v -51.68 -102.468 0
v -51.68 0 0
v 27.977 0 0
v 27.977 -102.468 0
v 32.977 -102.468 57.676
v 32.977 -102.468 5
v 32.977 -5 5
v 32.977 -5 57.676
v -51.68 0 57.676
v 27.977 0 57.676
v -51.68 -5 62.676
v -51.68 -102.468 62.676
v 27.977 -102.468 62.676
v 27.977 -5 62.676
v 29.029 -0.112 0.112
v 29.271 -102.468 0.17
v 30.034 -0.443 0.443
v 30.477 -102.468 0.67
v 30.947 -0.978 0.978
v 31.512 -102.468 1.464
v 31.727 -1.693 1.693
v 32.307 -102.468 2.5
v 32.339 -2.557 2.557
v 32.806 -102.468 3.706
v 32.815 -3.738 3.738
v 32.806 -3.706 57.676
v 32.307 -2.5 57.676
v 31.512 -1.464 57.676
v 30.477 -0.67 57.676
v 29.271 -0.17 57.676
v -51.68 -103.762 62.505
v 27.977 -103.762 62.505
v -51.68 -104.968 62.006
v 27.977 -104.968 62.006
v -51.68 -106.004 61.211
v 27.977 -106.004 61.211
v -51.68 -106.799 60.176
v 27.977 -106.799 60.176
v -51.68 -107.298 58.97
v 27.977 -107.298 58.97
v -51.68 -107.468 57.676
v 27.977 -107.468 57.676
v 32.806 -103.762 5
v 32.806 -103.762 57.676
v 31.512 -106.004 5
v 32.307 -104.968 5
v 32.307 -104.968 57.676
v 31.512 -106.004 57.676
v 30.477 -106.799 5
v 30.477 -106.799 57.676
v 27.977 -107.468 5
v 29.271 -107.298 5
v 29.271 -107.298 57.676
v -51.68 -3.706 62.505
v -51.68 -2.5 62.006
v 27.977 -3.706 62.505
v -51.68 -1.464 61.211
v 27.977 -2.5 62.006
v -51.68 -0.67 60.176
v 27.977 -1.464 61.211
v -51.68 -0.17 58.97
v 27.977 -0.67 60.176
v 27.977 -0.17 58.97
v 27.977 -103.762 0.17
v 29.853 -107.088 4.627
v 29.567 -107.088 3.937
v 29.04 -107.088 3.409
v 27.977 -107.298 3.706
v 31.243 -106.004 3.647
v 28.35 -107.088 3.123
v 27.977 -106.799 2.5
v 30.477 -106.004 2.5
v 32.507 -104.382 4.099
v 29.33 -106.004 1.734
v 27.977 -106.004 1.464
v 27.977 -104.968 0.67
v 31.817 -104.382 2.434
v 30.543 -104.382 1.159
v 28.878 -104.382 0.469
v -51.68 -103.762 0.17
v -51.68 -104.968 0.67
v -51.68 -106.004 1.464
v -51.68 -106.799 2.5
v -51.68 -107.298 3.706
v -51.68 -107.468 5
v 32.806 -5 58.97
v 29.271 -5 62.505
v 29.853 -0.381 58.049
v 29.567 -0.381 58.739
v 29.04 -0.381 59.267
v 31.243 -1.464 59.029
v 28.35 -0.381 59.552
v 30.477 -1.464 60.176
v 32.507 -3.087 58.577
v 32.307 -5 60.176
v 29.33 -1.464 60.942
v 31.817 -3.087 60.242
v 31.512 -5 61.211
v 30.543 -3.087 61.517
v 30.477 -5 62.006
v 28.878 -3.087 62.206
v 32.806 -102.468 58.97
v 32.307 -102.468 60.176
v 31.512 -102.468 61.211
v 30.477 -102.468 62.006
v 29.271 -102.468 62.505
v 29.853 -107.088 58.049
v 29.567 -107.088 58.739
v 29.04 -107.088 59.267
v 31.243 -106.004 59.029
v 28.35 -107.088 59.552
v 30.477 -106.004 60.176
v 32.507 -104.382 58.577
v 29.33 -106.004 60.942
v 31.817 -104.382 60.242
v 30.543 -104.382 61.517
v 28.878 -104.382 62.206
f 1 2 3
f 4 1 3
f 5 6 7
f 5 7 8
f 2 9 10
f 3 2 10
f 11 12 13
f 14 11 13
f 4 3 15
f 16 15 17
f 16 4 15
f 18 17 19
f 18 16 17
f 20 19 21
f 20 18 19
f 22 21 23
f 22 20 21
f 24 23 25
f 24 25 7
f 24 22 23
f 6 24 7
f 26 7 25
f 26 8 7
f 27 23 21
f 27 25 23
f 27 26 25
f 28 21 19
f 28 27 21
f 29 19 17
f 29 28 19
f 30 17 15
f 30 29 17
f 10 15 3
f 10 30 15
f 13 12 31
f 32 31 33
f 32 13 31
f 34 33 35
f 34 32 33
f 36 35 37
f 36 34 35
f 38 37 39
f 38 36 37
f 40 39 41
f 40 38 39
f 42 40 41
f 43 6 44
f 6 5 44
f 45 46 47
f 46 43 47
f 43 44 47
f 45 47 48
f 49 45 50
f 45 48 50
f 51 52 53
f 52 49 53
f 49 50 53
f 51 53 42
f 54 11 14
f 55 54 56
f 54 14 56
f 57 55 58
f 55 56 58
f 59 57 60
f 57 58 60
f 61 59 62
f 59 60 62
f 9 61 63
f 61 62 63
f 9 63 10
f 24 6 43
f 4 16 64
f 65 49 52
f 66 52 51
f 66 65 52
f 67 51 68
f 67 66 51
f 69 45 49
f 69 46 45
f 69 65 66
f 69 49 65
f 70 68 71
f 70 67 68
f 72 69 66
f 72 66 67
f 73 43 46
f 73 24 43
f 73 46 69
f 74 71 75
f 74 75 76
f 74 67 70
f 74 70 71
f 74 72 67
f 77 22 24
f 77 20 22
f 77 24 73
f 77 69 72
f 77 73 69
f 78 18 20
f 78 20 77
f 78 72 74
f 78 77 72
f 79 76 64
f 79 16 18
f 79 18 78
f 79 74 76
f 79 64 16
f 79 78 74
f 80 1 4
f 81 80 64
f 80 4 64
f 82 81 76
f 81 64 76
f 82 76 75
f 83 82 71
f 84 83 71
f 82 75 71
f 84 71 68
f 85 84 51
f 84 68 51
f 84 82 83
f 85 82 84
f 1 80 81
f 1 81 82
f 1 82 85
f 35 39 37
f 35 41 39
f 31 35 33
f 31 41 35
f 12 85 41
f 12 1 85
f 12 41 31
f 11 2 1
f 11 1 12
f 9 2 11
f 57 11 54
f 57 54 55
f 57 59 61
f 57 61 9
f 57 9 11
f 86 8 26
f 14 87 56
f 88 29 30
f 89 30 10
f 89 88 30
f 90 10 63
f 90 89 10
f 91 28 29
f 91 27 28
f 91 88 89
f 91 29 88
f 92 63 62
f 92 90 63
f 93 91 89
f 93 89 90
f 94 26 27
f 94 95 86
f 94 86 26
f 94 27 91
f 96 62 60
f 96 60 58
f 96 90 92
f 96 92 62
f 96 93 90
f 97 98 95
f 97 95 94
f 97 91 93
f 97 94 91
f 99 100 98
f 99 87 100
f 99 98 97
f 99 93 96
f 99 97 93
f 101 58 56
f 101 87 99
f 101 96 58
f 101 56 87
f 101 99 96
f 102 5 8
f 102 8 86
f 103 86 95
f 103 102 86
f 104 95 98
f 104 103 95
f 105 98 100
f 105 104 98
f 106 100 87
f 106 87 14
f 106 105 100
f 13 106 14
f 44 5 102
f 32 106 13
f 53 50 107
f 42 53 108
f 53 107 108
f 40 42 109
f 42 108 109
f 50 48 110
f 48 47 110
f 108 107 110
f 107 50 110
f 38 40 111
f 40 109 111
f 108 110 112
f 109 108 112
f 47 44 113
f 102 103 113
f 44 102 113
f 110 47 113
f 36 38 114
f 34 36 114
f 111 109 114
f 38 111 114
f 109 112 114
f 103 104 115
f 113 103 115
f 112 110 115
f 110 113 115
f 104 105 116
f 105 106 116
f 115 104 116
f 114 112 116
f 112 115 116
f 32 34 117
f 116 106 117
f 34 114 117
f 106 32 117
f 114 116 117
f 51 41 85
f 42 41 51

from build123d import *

# Parameters (mm, degrees)
F0_W     = 84.656242
F0_H     = 62.675737
F1_DEPTH = 107.468396
F2_R     = 5


with BuildPart() as f1:
    # F0 (on Front) → F1 (new body)
    with BuildSketch(Plane.XZ):
        with Locations((-9.351572, 31.337868)):
            Rectangle(F0_W, F0_H)
    extrude(amount=F1_DEPTH)

    # F2
    f2_edges = [f1.edges().sort_by_distance(p)[0] for p in [
        (32.976549, -53.734198, 0),
        (32.976549, -53.734198, 62.675737),
        (32.976549, 0, 31.337868),
        (32.976549, -107.468396, 31.337868),
        (-9.351572, -107.468396, 62.675737),
        (-9.351572, 0, 62.675737),
        (-9.351572, -107.468396, 0),
    ]]
    fillet(f2_edges, radius=F2_R)


solid = f1.part
